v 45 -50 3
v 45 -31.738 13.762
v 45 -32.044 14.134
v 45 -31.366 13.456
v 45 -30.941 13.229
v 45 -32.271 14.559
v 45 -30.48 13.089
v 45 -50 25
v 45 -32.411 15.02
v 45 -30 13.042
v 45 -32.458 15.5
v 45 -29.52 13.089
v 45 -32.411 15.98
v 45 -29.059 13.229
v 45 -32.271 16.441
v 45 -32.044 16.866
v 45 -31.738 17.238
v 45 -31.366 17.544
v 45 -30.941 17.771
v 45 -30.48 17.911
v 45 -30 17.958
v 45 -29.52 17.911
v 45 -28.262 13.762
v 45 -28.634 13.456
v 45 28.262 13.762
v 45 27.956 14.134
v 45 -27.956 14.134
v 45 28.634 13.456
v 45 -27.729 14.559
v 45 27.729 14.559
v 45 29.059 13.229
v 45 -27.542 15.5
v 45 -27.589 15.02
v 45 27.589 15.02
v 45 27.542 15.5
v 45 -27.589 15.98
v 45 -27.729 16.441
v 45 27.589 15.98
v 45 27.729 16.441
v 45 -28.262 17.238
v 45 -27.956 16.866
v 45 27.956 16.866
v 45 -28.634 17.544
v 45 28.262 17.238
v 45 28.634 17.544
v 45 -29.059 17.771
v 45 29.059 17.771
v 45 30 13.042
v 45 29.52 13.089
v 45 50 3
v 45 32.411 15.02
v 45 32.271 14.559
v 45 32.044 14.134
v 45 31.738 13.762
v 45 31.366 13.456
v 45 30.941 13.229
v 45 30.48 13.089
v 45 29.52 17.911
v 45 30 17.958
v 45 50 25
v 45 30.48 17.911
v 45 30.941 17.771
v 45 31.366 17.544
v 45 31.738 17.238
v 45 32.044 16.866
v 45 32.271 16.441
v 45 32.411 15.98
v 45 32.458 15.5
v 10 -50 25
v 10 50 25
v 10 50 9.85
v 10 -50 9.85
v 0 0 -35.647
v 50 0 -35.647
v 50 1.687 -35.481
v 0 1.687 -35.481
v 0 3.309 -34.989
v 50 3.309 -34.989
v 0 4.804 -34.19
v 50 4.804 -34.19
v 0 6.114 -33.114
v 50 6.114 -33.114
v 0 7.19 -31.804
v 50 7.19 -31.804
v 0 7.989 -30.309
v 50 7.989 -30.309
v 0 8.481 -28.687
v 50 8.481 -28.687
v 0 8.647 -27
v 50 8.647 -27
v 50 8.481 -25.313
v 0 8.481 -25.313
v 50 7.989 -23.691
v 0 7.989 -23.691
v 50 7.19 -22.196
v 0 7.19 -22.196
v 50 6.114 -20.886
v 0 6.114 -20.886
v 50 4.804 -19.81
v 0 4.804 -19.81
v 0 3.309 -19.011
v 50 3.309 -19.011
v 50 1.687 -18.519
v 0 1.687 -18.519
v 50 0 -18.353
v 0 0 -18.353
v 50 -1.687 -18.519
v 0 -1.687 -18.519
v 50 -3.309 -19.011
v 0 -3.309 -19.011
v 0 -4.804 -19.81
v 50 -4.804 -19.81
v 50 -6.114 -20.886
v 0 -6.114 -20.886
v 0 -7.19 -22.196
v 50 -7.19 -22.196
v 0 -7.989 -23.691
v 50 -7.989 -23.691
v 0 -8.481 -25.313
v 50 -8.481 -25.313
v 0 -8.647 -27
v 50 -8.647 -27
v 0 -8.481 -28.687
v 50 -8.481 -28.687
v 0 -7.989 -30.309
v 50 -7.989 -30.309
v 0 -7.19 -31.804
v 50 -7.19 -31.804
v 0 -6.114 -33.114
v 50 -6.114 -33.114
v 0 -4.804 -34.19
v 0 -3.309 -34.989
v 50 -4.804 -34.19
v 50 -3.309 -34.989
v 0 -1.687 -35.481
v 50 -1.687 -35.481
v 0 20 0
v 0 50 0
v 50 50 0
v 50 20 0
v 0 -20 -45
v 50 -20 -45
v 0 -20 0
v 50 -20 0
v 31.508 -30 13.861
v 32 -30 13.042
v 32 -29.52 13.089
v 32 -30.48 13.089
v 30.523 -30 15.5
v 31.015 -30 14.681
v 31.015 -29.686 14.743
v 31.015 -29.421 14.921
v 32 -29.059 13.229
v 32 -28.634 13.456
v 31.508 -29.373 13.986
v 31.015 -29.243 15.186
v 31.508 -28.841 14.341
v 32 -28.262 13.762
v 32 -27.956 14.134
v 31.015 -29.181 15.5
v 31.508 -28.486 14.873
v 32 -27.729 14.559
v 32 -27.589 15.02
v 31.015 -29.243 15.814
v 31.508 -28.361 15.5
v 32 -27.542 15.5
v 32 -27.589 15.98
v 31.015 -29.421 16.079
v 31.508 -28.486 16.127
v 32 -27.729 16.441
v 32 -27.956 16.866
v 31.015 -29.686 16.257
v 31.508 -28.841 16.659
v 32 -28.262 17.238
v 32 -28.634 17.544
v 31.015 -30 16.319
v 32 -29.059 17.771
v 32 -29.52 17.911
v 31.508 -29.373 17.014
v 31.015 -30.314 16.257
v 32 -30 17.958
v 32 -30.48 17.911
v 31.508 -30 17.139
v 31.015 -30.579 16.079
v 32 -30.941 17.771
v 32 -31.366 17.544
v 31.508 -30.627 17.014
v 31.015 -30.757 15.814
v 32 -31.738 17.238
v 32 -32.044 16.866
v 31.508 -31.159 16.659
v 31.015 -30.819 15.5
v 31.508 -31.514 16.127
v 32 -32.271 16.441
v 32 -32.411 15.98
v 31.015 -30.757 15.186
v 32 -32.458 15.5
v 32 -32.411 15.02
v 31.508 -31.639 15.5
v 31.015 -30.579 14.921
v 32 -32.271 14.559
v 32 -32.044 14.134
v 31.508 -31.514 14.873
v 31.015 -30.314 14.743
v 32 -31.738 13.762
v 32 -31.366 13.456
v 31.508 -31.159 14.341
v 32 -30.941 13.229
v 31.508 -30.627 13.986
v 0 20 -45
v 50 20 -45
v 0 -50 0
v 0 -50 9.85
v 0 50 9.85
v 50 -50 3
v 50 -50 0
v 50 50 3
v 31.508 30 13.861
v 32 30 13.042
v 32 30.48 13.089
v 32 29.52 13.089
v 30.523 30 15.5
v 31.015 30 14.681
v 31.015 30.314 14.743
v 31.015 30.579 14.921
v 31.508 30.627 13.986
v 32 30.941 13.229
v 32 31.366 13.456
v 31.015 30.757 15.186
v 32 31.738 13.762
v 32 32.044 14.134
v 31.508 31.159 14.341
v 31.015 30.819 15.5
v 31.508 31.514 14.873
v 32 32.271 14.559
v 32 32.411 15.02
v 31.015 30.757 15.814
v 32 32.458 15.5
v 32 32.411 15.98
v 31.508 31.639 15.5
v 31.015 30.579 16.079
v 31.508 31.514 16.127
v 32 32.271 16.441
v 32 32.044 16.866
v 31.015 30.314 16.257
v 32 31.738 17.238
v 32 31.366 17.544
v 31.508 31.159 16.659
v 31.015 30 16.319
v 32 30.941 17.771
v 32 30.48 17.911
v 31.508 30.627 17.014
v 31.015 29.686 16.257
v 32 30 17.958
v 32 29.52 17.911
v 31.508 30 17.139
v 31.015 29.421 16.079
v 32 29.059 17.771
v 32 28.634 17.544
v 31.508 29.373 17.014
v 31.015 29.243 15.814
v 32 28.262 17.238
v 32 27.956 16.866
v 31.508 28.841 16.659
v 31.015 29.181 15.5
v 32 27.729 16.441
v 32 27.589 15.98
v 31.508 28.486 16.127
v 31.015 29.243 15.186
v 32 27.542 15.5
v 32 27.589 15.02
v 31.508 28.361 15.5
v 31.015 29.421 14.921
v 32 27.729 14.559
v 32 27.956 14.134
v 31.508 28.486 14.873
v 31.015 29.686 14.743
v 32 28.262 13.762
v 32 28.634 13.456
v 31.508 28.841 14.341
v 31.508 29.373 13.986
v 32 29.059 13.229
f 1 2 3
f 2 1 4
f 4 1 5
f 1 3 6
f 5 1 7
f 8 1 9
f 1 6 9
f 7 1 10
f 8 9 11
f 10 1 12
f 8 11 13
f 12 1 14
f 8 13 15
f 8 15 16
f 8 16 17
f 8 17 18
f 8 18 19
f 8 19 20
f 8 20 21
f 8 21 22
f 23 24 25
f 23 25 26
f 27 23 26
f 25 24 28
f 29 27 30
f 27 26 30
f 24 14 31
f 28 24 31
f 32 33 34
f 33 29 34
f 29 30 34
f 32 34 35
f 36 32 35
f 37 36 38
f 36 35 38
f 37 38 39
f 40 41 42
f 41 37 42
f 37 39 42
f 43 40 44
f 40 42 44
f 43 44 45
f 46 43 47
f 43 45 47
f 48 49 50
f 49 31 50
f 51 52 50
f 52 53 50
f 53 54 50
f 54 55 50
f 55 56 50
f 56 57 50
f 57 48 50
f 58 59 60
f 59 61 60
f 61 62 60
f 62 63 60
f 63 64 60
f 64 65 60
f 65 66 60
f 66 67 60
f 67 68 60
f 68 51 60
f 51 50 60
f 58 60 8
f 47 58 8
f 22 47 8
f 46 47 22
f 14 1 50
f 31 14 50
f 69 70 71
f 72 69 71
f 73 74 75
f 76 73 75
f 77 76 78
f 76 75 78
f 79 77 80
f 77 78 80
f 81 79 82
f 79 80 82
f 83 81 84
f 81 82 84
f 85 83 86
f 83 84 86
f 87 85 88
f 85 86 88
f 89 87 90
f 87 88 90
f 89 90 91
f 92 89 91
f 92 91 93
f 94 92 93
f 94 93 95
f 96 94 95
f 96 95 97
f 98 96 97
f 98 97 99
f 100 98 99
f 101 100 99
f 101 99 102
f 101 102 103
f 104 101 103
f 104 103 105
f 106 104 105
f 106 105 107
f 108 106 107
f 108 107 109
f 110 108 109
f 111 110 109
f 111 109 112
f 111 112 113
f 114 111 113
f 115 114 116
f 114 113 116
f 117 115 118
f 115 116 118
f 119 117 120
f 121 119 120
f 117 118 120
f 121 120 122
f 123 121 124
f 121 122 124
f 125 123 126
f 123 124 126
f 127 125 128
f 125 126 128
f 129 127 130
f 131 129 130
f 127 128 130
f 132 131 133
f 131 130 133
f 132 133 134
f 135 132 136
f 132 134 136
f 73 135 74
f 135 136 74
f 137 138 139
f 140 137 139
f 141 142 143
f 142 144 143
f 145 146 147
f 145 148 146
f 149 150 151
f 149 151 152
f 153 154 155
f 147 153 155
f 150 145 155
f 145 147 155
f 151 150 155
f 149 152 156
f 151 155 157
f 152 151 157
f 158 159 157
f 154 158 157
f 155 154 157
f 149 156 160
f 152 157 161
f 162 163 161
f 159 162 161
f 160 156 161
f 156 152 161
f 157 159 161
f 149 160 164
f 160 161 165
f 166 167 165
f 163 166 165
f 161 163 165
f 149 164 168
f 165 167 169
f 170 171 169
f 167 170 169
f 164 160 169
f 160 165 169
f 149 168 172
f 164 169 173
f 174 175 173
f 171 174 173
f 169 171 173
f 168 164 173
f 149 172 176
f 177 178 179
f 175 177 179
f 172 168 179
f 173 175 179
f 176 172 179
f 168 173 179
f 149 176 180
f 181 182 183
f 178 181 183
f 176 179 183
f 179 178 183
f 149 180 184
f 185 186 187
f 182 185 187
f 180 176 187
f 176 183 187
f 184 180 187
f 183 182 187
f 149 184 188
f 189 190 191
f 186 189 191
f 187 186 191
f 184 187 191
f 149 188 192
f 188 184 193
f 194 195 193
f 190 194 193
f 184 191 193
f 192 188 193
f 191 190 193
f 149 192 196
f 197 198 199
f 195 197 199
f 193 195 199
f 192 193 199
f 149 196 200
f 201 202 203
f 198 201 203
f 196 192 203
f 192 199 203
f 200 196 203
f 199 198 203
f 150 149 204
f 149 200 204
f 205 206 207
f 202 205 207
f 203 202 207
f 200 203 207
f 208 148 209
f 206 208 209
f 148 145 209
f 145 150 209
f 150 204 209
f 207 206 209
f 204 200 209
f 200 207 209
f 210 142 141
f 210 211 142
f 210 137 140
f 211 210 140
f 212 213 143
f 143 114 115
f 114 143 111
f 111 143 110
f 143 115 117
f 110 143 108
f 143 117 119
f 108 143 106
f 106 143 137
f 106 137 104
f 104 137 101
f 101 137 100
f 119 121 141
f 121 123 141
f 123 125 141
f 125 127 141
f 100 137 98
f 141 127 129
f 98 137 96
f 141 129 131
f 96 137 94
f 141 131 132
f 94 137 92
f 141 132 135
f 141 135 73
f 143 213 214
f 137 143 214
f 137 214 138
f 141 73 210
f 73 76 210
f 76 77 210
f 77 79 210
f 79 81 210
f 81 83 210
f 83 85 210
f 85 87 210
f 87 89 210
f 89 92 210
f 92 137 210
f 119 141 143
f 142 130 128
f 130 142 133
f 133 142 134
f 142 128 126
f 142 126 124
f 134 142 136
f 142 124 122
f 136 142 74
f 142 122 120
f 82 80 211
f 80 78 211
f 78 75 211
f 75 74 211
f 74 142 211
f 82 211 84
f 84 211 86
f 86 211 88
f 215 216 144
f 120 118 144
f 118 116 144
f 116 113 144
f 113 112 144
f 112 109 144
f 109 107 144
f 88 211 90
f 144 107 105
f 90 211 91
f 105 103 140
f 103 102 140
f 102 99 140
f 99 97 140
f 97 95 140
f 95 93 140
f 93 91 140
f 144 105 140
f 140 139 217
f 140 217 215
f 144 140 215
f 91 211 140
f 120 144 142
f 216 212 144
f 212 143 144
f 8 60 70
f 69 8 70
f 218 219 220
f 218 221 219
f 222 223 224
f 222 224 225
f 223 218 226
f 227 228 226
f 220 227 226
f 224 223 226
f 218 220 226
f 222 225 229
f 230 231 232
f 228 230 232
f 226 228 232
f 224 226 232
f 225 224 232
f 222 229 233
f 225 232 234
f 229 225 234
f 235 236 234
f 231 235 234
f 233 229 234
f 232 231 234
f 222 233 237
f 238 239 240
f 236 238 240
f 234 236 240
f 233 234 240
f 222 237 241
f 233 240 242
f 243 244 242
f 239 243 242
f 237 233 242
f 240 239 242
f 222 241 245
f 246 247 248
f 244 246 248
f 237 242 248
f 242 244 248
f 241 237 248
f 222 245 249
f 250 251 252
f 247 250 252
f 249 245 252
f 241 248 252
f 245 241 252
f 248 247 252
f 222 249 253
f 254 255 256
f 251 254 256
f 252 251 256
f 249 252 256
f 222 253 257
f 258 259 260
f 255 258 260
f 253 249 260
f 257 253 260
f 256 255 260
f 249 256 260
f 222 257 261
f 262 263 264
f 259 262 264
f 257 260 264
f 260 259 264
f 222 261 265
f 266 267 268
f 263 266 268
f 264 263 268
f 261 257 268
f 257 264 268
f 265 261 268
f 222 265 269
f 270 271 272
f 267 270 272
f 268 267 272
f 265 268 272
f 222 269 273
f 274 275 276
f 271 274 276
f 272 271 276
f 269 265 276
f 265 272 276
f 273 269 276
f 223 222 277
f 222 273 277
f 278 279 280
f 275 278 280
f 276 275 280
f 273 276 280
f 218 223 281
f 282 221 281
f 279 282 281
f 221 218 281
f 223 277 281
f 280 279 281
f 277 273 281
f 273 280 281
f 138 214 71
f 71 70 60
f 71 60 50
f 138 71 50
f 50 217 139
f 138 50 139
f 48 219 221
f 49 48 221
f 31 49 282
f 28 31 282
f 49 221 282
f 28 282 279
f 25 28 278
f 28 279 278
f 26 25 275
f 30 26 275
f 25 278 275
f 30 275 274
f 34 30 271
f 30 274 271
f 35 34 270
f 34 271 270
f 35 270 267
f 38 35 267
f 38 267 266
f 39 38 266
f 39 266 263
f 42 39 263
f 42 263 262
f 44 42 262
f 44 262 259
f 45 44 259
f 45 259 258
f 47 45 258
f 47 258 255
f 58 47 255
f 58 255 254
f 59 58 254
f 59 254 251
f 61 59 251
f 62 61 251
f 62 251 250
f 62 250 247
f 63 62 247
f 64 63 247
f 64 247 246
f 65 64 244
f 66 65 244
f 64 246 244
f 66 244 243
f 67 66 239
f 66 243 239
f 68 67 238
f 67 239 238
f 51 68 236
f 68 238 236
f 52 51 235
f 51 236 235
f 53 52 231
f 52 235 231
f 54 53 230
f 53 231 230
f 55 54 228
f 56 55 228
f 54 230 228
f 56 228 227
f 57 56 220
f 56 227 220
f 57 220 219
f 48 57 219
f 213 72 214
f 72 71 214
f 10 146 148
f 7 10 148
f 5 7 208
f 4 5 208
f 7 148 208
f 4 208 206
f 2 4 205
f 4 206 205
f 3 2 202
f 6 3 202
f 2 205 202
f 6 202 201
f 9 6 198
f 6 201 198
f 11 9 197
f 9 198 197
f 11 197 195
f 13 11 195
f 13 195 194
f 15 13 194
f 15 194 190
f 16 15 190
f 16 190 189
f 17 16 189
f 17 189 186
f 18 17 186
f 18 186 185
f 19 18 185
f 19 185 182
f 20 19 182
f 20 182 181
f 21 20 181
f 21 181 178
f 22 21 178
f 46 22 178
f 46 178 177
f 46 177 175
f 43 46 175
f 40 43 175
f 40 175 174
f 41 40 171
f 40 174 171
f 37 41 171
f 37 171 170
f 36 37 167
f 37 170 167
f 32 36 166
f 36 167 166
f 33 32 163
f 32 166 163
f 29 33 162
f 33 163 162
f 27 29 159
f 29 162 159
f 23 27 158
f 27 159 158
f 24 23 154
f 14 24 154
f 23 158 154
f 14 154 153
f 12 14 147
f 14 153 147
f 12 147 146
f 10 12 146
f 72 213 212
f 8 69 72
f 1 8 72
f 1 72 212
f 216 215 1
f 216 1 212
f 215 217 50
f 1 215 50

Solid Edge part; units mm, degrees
sketch "Sketch1" plane through (0, 0, 0) normal (0, -1, 0) x (1, 0, 0)
  line L0 (0, 0) -> (50, 0)
  line L1 (50, 0) -> (50, 3)
  line L2 (50, 3) -> (45, 3)
  line L3 (45, 3) -> (45, 25)
  line L4 (45, 25) -> (10, 25)
  line L5 (10, 25) -> (10, 24.85)
  line L6 (10, 24.85) -> (10, 9.85)
  line L7 (10, 9.85) -> (0, 9.85)
  line L8 (0, 9.85) -> (0, 0)
extrude "Protrusion1" add sketch "Sketch1" along normal mid plane 100
sketch "Sketch2" plane through (25, 0, 0) normal (0, 0, -1) x (1, 0, 0)
  line L0 (-25, -20) -> (25, -20)
  line L1 (25, -20) -> (25, 20)
  line L2 (25, 20) -> (-25, 20)
  line L3 (-25, 20) -> (-25, -20)
  dimension "D1" = 40
extrude "ExtrudedProtrusion_2" add sketch "Sketch2" along normal blind 45
hole "Hole_1" at (50, 0, -27) direction (-1, 0, 0) diameter 17.294 end through all
hole "Hole_8" at (45, -30, 15.5) direction (-1, 0, 0) diameter 4.917 depth 13 tip angle 118 thread major 6 thread length 10
hole "Hole1" at (45, 30, 15.5) direction (-1, 0, 0) diameter 4.917 depth 13 tip angle 118 thread major 6 thread length 10
properties part number "2" material "cast iron"
